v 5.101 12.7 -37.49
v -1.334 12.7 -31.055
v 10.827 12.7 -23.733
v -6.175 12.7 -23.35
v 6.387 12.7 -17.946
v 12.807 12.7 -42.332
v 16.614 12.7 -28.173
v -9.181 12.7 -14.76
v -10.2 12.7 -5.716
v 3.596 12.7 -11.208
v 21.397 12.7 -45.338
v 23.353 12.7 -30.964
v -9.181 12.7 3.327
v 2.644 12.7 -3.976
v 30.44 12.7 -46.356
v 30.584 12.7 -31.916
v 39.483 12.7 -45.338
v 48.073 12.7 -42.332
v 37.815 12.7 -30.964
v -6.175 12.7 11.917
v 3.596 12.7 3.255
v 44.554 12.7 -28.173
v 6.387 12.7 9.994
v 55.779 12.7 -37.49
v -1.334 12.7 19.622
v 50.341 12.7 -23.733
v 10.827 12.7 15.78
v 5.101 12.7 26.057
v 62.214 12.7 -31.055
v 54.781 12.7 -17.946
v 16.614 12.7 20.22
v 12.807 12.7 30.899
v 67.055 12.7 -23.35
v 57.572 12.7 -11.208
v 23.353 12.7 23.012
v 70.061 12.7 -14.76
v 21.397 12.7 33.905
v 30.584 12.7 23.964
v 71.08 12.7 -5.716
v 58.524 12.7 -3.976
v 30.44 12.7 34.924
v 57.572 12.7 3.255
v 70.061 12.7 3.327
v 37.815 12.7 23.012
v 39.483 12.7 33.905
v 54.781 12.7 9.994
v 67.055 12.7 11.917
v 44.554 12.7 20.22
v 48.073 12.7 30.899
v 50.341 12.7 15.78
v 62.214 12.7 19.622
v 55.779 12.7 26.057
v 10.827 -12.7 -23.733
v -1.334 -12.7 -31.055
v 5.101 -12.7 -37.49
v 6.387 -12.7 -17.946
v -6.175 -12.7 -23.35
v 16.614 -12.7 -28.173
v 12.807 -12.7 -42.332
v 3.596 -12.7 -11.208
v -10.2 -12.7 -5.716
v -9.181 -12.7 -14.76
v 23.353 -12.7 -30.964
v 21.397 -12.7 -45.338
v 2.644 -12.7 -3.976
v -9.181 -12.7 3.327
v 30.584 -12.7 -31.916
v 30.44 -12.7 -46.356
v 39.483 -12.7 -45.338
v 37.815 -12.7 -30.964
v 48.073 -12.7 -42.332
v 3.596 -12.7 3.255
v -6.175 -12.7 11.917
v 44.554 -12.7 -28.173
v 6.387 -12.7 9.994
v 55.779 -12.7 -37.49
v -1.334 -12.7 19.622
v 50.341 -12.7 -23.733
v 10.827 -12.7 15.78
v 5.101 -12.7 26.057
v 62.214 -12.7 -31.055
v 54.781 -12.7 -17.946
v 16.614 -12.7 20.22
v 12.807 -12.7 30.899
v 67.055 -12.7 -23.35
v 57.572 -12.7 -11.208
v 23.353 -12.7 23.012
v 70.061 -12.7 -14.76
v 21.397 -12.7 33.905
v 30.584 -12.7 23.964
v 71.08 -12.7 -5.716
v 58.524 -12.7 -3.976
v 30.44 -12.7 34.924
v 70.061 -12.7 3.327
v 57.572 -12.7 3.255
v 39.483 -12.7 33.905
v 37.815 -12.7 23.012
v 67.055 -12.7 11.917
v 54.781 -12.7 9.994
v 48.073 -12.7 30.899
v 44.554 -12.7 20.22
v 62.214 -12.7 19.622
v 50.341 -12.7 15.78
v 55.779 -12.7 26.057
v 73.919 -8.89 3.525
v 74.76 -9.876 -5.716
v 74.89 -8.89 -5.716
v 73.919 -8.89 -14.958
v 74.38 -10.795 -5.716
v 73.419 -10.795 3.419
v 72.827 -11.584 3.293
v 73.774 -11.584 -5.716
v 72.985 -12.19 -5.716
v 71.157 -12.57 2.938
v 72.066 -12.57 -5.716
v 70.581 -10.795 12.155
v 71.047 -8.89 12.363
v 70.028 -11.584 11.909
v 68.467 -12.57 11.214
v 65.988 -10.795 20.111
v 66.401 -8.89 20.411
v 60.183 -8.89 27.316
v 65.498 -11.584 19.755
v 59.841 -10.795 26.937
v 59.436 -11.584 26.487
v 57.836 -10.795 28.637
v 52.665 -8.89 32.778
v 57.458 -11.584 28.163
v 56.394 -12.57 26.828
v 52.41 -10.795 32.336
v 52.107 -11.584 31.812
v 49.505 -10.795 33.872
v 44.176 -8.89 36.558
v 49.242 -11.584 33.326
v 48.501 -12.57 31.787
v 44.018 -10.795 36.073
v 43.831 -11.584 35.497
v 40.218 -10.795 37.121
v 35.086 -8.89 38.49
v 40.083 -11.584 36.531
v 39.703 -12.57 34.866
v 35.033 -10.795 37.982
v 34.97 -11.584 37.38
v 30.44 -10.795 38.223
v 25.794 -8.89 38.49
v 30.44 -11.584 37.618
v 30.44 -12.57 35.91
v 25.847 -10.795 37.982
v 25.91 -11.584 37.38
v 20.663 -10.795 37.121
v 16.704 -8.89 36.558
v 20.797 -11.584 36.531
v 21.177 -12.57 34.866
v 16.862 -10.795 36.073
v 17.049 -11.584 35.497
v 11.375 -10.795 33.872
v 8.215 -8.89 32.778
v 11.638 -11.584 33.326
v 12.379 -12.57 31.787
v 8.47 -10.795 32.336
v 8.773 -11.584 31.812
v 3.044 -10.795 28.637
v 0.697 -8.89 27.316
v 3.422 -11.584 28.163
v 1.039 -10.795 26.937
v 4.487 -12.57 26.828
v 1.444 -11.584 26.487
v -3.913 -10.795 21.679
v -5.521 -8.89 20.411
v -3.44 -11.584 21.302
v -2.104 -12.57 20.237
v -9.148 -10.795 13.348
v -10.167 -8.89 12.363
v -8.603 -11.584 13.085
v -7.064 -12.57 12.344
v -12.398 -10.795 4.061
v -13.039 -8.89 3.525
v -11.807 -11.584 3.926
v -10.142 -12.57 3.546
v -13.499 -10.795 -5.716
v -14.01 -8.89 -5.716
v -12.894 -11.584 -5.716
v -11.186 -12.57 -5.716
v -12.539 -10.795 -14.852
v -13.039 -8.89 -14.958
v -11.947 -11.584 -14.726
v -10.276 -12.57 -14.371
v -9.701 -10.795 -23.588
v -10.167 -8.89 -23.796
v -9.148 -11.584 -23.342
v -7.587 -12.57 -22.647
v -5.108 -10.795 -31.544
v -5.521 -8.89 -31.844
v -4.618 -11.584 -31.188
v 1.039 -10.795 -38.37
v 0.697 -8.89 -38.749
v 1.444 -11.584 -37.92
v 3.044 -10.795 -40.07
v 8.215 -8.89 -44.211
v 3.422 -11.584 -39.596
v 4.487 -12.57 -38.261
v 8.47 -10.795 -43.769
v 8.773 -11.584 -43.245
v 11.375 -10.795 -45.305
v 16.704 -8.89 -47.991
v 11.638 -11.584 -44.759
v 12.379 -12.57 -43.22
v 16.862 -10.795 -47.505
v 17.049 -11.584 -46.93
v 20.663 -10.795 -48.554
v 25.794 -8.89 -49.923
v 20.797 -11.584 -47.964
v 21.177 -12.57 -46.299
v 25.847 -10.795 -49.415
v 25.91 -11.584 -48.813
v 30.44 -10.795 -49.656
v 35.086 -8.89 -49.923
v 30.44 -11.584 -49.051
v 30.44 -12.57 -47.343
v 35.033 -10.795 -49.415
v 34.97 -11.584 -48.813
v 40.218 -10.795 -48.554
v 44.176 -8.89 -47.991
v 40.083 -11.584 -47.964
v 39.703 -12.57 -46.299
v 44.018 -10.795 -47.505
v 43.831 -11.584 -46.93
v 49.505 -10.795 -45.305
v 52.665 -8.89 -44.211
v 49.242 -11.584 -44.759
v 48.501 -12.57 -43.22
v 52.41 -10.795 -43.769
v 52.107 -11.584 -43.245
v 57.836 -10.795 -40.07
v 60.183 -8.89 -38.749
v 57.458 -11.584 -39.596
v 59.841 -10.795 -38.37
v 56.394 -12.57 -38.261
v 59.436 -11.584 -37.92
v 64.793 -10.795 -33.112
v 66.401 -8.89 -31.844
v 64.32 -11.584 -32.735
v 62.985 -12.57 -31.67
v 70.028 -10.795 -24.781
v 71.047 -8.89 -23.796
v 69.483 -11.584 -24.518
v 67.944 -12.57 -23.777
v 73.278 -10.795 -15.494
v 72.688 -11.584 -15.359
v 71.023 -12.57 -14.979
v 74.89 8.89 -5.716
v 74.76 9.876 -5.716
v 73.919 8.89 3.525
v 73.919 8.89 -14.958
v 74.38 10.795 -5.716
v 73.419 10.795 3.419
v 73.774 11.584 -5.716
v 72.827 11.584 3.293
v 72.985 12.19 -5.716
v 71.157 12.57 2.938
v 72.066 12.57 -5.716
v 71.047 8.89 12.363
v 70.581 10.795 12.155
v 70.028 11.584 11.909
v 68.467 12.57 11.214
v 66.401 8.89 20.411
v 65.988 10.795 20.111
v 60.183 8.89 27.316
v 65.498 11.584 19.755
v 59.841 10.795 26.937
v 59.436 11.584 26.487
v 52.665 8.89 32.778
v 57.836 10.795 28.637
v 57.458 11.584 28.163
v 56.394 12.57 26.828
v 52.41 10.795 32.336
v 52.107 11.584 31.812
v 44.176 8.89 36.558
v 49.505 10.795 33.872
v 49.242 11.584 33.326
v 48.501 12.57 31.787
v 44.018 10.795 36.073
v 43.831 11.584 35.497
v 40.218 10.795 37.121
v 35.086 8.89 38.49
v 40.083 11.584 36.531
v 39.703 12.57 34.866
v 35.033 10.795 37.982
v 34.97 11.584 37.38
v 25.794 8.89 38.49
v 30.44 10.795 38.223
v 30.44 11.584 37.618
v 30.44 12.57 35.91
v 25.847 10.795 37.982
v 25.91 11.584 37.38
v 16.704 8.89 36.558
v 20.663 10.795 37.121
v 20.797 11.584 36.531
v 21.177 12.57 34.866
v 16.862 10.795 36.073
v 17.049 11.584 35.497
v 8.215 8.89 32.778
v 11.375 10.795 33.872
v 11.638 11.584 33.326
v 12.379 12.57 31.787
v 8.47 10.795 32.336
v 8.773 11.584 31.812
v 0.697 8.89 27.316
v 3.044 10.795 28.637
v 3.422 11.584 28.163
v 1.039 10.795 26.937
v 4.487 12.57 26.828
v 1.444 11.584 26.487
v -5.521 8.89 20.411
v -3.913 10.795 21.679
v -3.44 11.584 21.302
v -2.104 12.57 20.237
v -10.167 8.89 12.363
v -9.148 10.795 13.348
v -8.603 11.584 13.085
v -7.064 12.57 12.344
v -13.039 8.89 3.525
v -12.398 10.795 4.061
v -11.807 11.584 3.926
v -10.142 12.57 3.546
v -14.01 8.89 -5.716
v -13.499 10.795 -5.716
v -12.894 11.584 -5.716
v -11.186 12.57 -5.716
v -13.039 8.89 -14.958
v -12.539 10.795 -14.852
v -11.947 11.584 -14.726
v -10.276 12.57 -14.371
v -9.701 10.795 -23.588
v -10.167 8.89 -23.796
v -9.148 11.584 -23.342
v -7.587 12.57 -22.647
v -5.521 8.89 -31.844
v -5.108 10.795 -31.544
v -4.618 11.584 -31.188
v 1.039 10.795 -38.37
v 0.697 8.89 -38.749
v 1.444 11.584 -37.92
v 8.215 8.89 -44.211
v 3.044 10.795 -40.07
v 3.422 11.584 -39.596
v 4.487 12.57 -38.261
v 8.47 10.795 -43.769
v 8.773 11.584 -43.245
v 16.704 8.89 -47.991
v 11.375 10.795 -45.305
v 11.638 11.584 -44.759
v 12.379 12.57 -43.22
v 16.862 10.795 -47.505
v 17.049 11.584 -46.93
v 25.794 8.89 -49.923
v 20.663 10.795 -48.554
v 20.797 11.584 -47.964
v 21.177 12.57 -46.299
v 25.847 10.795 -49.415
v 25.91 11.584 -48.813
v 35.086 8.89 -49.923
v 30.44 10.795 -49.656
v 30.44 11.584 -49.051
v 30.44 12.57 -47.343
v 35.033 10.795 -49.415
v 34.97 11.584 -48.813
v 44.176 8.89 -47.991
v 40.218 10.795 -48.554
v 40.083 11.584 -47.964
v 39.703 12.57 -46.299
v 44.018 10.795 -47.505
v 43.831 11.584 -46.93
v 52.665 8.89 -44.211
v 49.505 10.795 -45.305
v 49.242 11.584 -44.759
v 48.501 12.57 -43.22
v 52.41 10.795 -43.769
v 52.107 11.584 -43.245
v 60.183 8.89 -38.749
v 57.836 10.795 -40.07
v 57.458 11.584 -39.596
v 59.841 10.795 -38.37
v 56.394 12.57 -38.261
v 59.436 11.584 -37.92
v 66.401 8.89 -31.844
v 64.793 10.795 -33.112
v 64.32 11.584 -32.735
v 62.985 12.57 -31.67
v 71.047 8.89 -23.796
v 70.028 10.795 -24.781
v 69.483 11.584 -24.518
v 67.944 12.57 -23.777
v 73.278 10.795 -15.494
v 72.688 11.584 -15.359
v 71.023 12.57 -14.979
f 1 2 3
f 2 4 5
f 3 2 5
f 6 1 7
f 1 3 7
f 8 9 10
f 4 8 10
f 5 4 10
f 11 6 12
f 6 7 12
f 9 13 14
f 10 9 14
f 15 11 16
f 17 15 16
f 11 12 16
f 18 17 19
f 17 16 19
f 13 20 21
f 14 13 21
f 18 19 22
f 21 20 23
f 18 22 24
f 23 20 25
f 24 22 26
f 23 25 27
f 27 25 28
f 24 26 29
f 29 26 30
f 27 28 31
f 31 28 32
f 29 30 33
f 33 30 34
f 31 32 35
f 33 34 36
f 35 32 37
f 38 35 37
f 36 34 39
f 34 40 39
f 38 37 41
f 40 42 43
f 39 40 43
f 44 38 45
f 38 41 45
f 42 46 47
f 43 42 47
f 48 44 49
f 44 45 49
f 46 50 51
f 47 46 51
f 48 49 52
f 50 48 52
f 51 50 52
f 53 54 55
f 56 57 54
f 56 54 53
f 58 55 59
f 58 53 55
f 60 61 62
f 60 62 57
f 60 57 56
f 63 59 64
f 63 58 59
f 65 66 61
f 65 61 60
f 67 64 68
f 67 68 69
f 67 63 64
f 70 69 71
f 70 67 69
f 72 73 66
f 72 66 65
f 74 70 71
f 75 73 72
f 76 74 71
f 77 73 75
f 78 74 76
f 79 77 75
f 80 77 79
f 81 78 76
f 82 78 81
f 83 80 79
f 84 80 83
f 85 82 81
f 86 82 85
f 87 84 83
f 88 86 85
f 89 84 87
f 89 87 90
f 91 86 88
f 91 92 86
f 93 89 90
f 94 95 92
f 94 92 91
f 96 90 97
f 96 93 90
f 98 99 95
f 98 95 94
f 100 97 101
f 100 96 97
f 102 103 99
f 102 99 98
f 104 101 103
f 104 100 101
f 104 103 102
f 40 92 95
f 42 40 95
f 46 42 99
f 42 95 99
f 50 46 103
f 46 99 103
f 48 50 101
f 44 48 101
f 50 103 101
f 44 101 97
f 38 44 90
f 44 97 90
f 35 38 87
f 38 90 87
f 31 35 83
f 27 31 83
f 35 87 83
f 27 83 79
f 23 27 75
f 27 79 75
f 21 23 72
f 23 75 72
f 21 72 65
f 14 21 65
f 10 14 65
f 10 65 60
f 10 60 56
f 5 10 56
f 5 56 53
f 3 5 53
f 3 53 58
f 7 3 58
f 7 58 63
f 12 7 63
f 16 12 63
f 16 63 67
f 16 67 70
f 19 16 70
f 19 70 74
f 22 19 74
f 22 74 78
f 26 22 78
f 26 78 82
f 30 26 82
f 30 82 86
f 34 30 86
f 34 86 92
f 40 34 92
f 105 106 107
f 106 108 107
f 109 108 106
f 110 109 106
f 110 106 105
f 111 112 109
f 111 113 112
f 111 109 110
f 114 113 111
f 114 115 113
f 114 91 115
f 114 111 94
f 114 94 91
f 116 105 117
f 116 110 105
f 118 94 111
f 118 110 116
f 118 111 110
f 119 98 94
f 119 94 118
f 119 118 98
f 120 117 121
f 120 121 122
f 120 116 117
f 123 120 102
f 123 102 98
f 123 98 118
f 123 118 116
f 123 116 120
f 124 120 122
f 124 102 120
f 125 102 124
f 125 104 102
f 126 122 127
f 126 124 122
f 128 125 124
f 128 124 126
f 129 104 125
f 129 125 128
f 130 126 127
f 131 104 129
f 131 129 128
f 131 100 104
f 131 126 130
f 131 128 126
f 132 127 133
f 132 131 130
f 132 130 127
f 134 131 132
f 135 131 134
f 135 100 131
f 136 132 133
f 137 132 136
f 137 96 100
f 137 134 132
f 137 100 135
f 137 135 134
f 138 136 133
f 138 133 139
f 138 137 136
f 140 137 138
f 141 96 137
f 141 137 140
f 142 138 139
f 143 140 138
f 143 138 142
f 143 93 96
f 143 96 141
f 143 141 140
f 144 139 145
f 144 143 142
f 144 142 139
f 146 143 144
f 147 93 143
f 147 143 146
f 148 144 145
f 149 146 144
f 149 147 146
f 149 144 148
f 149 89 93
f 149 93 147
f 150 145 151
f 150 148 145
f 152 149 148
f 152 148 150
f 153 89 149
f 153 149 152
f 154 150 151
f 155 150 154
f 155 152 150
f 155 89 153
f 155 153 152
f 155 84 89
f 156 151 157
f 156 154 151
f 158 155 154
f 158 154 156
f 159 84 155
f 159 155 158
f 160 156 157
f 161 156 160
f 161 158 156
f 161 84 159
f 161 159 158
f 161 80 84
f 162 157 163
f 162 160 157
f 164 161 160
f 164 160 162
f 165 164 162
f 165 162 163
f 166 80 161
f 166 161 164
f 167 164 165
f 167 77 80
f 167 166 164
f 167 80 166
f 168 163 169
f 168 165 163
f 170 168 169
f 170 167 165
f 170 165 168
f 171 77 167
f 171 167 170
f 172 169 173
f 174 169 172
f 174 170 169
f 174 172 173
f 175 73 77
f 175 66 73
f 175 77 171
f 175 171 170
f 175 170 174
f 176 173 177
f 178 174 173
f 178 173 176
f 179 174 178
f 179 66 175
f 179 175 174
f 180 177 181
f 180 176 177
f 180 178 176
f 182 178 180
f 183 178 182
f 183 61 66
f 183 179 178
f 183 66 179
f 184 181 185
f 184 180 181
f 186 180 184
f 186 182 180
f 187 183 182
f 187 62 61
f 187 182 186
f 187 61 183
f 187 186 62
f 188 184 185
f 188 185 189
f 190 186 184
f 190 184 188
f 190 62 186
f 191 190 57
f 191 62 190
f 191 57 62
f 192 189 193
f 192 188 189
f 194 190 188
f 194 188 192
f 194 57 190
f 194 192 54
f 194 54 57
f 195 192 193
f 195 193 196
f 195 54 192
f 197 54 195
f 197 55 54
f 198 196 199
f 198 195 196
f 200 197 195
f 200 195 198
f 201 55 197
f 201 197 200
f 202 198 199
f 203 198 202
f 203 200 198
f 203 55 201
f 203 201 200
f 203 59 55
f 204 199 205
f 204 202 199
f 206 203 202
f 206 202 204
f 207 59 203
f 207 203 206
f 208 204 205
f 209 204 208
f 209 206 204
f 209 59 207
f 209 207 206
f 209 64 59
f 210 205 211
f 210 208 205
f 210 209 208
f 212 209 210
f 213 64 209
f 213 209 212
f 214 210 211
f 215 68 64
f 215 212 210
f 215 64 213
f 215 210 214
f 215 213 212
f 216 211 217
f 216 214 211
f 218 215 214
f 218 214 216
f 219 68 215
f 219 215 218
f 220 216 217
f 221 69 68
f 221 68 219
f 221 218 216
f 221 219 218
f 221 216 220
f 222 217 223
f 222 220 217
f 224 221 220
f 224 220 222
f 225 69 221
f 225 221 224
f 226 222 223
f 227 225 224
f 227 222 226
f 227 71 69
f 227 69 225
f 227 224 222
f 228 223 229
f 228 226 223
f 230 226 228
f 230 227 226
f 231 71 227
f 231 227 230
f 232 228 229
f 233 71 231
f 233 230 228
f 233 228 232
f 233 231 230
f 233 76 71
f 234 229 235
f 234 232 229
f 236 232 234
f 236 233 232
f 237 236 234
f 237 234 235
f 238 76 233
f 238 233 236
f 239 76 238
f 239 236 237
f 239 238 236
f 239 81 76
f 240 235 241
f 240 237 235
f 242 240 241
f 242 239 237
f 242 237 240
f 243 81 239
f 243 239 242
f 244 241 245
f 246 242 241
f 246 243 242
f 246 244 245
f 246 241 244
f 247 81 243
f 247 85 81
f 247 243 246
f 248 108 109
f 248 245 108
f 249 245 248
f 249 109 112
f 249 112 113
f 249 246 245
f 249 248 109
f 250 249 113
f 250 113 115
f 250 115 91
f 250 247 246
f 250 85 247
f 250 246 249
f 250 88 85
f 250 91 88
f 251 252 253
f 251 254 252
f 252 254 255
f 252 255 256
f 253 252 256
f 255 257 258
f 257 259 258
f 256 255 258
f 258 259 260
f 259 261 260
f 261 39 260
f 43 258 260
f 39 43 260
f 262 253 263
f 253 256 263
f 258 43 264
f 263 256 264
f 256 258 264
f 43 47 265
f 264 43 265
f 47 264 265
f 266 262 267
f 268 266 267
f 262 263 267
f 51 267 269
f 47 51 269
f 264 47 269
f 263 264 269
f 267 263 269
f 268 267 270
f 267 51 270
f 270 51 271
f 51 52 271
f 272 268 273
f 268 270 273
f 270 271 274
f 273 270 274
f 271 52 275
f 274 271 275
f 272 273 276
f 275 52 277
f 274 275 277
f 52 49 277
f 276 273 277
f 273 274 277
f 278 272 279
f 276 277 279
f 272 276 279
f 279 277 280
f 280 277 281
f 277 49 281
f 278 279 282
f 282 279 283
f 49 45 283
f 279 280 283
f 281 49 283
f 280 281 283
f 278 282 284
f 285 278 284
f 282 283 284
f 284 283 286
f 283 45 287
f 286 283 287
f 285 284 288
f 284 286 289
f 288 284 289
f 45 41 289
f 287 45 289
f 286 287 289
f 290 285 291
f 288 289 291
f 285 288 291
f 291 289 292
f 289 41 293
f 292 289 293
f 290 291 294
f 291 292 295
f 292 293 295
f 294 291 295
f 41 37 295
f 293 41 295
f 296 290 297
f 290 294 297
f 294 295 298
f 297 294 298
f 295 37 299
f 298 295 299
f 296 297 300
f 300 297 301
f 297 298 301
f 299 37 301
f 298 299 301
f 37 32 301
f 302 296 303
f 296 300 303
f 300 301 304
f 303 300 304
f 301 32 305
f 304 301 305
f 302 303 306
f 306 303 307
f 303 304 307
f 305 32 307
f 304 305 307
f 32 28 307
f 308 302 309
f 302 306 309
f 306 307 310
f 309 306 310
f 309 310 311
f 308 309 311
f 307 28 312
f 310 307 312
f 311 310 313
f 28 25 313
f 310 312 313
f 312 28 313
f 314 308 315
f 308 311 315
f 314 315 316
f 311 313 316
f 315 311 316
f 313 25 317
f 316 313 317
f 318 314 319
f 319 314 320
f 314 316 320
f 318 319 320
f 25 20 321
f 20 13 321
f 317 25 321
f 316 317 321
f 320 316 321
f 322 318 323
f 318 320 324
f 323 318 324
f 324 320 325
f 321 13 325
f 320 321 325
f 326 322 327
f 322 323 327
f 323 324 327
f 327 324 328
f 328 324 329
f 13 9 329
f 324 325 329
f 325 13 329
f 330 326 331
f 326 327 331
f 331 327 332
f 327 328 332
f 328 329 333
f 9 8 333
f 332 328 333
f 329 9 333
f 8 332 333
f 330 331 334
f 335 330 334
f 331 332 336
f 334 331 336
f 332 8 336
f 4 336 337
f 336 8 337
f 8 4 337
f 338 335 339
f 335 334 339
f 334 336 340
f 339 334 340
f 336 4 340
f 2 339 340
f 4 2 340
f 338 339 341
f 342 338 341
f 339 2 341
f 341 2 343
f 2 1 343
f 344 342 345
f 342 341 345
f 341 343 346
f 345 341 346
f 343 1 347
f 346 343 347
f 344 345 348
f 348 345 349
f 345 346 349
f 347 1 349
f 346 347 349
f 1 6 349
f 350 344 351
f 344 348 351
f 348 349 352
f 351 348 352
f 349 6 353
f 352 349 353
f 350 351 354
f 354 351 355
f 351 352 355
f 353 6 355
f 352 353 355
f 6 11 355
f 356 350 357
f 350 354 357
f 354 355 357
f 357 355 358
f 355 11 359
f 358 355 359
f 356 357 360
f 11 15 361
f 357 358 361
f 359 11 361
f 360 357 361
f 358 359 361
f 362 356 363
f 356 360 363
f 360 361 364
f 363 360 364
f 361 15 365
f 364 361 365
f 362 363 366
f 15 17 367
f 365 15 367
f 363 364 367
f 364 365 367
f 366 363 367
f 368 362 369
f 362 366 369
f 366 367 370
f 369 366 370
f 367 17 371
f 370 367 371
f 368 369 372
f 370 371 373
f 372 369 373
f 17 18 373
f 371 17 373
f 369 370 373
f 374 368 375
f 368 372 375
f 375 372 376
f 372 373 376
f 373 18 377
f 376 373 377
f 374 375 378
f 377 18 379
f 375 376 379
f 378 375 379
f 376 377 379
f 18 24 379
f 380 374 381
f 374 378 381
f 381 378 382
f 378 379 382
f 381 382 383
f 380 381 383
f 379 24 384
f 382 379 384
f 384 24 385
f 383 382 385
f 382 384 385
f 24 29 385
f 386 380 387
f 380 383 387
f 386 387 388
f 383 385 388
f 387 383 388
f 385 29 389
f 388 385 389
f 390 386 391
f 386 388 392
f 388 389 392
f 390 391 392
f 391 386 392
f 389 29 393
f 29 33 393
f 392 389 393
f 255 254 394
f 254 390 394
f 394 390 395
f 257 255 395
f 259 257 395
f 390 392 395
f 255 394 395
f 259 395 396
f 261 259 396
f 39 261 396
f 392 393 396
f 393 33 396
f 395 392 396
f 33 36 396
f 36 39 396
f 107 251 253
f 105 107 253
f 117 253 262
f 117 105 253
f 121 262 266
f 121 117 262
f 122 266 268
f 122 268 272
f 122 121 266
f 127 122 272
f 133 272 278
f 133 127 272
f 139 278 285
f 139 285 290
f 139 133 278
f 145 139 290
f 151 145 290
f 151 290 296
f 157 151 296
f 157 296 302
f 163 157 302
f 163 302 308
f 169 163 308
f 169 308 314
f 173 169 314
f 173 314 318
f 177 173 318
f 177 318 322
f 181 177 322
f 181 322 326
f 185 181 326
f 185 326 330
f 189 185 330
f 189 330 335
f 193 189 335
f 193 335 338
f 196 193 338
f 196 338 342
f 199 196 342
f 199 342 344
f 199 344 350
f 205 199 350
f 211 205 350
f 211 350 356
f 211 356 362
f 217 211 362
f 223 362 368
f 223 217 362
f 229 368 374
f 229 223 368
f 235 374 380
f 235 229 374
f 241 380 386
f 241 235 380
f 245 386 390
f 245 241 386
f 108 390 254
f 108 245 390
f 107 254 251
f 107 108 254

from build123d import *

# Parameters (mm, degrees)
F0_R     = 44.45
F1_DEPTH = 12.7
F2_R     = 3.81
F3_R     = 27.94
F4_DEPTH = 25.401


with BuildPart() as f1:
    # F0 (on Front) → F1 (new body, symmetric)
    with BuildSketch(Plane.XZ):
        with Locations((30.440104, -5.716477)):
            Circle(F0_R)
    extrude(amount=F1_DEPTH, both=True)

    # F2
    f2_edges = [f1.edges().sort_by_distance(p)[0] for p in [
        (-14.009896, -12.7, -5.716477),
        (-14.009896, 12.7, -5.716477),
    ]]
    fillet(f2_edges, radius=F2_R)

    # F3 (on face) → F4 (cut, through all)
    with BuildSketch(Plane.XZ.offset(12.7)):
        with Locations((30.583977, -3.976314)):
            Circle(F3_R)
    extrude(amount=-F4_DEPTH, mode=Mode.SUBTRACT)


solid = f1.part
